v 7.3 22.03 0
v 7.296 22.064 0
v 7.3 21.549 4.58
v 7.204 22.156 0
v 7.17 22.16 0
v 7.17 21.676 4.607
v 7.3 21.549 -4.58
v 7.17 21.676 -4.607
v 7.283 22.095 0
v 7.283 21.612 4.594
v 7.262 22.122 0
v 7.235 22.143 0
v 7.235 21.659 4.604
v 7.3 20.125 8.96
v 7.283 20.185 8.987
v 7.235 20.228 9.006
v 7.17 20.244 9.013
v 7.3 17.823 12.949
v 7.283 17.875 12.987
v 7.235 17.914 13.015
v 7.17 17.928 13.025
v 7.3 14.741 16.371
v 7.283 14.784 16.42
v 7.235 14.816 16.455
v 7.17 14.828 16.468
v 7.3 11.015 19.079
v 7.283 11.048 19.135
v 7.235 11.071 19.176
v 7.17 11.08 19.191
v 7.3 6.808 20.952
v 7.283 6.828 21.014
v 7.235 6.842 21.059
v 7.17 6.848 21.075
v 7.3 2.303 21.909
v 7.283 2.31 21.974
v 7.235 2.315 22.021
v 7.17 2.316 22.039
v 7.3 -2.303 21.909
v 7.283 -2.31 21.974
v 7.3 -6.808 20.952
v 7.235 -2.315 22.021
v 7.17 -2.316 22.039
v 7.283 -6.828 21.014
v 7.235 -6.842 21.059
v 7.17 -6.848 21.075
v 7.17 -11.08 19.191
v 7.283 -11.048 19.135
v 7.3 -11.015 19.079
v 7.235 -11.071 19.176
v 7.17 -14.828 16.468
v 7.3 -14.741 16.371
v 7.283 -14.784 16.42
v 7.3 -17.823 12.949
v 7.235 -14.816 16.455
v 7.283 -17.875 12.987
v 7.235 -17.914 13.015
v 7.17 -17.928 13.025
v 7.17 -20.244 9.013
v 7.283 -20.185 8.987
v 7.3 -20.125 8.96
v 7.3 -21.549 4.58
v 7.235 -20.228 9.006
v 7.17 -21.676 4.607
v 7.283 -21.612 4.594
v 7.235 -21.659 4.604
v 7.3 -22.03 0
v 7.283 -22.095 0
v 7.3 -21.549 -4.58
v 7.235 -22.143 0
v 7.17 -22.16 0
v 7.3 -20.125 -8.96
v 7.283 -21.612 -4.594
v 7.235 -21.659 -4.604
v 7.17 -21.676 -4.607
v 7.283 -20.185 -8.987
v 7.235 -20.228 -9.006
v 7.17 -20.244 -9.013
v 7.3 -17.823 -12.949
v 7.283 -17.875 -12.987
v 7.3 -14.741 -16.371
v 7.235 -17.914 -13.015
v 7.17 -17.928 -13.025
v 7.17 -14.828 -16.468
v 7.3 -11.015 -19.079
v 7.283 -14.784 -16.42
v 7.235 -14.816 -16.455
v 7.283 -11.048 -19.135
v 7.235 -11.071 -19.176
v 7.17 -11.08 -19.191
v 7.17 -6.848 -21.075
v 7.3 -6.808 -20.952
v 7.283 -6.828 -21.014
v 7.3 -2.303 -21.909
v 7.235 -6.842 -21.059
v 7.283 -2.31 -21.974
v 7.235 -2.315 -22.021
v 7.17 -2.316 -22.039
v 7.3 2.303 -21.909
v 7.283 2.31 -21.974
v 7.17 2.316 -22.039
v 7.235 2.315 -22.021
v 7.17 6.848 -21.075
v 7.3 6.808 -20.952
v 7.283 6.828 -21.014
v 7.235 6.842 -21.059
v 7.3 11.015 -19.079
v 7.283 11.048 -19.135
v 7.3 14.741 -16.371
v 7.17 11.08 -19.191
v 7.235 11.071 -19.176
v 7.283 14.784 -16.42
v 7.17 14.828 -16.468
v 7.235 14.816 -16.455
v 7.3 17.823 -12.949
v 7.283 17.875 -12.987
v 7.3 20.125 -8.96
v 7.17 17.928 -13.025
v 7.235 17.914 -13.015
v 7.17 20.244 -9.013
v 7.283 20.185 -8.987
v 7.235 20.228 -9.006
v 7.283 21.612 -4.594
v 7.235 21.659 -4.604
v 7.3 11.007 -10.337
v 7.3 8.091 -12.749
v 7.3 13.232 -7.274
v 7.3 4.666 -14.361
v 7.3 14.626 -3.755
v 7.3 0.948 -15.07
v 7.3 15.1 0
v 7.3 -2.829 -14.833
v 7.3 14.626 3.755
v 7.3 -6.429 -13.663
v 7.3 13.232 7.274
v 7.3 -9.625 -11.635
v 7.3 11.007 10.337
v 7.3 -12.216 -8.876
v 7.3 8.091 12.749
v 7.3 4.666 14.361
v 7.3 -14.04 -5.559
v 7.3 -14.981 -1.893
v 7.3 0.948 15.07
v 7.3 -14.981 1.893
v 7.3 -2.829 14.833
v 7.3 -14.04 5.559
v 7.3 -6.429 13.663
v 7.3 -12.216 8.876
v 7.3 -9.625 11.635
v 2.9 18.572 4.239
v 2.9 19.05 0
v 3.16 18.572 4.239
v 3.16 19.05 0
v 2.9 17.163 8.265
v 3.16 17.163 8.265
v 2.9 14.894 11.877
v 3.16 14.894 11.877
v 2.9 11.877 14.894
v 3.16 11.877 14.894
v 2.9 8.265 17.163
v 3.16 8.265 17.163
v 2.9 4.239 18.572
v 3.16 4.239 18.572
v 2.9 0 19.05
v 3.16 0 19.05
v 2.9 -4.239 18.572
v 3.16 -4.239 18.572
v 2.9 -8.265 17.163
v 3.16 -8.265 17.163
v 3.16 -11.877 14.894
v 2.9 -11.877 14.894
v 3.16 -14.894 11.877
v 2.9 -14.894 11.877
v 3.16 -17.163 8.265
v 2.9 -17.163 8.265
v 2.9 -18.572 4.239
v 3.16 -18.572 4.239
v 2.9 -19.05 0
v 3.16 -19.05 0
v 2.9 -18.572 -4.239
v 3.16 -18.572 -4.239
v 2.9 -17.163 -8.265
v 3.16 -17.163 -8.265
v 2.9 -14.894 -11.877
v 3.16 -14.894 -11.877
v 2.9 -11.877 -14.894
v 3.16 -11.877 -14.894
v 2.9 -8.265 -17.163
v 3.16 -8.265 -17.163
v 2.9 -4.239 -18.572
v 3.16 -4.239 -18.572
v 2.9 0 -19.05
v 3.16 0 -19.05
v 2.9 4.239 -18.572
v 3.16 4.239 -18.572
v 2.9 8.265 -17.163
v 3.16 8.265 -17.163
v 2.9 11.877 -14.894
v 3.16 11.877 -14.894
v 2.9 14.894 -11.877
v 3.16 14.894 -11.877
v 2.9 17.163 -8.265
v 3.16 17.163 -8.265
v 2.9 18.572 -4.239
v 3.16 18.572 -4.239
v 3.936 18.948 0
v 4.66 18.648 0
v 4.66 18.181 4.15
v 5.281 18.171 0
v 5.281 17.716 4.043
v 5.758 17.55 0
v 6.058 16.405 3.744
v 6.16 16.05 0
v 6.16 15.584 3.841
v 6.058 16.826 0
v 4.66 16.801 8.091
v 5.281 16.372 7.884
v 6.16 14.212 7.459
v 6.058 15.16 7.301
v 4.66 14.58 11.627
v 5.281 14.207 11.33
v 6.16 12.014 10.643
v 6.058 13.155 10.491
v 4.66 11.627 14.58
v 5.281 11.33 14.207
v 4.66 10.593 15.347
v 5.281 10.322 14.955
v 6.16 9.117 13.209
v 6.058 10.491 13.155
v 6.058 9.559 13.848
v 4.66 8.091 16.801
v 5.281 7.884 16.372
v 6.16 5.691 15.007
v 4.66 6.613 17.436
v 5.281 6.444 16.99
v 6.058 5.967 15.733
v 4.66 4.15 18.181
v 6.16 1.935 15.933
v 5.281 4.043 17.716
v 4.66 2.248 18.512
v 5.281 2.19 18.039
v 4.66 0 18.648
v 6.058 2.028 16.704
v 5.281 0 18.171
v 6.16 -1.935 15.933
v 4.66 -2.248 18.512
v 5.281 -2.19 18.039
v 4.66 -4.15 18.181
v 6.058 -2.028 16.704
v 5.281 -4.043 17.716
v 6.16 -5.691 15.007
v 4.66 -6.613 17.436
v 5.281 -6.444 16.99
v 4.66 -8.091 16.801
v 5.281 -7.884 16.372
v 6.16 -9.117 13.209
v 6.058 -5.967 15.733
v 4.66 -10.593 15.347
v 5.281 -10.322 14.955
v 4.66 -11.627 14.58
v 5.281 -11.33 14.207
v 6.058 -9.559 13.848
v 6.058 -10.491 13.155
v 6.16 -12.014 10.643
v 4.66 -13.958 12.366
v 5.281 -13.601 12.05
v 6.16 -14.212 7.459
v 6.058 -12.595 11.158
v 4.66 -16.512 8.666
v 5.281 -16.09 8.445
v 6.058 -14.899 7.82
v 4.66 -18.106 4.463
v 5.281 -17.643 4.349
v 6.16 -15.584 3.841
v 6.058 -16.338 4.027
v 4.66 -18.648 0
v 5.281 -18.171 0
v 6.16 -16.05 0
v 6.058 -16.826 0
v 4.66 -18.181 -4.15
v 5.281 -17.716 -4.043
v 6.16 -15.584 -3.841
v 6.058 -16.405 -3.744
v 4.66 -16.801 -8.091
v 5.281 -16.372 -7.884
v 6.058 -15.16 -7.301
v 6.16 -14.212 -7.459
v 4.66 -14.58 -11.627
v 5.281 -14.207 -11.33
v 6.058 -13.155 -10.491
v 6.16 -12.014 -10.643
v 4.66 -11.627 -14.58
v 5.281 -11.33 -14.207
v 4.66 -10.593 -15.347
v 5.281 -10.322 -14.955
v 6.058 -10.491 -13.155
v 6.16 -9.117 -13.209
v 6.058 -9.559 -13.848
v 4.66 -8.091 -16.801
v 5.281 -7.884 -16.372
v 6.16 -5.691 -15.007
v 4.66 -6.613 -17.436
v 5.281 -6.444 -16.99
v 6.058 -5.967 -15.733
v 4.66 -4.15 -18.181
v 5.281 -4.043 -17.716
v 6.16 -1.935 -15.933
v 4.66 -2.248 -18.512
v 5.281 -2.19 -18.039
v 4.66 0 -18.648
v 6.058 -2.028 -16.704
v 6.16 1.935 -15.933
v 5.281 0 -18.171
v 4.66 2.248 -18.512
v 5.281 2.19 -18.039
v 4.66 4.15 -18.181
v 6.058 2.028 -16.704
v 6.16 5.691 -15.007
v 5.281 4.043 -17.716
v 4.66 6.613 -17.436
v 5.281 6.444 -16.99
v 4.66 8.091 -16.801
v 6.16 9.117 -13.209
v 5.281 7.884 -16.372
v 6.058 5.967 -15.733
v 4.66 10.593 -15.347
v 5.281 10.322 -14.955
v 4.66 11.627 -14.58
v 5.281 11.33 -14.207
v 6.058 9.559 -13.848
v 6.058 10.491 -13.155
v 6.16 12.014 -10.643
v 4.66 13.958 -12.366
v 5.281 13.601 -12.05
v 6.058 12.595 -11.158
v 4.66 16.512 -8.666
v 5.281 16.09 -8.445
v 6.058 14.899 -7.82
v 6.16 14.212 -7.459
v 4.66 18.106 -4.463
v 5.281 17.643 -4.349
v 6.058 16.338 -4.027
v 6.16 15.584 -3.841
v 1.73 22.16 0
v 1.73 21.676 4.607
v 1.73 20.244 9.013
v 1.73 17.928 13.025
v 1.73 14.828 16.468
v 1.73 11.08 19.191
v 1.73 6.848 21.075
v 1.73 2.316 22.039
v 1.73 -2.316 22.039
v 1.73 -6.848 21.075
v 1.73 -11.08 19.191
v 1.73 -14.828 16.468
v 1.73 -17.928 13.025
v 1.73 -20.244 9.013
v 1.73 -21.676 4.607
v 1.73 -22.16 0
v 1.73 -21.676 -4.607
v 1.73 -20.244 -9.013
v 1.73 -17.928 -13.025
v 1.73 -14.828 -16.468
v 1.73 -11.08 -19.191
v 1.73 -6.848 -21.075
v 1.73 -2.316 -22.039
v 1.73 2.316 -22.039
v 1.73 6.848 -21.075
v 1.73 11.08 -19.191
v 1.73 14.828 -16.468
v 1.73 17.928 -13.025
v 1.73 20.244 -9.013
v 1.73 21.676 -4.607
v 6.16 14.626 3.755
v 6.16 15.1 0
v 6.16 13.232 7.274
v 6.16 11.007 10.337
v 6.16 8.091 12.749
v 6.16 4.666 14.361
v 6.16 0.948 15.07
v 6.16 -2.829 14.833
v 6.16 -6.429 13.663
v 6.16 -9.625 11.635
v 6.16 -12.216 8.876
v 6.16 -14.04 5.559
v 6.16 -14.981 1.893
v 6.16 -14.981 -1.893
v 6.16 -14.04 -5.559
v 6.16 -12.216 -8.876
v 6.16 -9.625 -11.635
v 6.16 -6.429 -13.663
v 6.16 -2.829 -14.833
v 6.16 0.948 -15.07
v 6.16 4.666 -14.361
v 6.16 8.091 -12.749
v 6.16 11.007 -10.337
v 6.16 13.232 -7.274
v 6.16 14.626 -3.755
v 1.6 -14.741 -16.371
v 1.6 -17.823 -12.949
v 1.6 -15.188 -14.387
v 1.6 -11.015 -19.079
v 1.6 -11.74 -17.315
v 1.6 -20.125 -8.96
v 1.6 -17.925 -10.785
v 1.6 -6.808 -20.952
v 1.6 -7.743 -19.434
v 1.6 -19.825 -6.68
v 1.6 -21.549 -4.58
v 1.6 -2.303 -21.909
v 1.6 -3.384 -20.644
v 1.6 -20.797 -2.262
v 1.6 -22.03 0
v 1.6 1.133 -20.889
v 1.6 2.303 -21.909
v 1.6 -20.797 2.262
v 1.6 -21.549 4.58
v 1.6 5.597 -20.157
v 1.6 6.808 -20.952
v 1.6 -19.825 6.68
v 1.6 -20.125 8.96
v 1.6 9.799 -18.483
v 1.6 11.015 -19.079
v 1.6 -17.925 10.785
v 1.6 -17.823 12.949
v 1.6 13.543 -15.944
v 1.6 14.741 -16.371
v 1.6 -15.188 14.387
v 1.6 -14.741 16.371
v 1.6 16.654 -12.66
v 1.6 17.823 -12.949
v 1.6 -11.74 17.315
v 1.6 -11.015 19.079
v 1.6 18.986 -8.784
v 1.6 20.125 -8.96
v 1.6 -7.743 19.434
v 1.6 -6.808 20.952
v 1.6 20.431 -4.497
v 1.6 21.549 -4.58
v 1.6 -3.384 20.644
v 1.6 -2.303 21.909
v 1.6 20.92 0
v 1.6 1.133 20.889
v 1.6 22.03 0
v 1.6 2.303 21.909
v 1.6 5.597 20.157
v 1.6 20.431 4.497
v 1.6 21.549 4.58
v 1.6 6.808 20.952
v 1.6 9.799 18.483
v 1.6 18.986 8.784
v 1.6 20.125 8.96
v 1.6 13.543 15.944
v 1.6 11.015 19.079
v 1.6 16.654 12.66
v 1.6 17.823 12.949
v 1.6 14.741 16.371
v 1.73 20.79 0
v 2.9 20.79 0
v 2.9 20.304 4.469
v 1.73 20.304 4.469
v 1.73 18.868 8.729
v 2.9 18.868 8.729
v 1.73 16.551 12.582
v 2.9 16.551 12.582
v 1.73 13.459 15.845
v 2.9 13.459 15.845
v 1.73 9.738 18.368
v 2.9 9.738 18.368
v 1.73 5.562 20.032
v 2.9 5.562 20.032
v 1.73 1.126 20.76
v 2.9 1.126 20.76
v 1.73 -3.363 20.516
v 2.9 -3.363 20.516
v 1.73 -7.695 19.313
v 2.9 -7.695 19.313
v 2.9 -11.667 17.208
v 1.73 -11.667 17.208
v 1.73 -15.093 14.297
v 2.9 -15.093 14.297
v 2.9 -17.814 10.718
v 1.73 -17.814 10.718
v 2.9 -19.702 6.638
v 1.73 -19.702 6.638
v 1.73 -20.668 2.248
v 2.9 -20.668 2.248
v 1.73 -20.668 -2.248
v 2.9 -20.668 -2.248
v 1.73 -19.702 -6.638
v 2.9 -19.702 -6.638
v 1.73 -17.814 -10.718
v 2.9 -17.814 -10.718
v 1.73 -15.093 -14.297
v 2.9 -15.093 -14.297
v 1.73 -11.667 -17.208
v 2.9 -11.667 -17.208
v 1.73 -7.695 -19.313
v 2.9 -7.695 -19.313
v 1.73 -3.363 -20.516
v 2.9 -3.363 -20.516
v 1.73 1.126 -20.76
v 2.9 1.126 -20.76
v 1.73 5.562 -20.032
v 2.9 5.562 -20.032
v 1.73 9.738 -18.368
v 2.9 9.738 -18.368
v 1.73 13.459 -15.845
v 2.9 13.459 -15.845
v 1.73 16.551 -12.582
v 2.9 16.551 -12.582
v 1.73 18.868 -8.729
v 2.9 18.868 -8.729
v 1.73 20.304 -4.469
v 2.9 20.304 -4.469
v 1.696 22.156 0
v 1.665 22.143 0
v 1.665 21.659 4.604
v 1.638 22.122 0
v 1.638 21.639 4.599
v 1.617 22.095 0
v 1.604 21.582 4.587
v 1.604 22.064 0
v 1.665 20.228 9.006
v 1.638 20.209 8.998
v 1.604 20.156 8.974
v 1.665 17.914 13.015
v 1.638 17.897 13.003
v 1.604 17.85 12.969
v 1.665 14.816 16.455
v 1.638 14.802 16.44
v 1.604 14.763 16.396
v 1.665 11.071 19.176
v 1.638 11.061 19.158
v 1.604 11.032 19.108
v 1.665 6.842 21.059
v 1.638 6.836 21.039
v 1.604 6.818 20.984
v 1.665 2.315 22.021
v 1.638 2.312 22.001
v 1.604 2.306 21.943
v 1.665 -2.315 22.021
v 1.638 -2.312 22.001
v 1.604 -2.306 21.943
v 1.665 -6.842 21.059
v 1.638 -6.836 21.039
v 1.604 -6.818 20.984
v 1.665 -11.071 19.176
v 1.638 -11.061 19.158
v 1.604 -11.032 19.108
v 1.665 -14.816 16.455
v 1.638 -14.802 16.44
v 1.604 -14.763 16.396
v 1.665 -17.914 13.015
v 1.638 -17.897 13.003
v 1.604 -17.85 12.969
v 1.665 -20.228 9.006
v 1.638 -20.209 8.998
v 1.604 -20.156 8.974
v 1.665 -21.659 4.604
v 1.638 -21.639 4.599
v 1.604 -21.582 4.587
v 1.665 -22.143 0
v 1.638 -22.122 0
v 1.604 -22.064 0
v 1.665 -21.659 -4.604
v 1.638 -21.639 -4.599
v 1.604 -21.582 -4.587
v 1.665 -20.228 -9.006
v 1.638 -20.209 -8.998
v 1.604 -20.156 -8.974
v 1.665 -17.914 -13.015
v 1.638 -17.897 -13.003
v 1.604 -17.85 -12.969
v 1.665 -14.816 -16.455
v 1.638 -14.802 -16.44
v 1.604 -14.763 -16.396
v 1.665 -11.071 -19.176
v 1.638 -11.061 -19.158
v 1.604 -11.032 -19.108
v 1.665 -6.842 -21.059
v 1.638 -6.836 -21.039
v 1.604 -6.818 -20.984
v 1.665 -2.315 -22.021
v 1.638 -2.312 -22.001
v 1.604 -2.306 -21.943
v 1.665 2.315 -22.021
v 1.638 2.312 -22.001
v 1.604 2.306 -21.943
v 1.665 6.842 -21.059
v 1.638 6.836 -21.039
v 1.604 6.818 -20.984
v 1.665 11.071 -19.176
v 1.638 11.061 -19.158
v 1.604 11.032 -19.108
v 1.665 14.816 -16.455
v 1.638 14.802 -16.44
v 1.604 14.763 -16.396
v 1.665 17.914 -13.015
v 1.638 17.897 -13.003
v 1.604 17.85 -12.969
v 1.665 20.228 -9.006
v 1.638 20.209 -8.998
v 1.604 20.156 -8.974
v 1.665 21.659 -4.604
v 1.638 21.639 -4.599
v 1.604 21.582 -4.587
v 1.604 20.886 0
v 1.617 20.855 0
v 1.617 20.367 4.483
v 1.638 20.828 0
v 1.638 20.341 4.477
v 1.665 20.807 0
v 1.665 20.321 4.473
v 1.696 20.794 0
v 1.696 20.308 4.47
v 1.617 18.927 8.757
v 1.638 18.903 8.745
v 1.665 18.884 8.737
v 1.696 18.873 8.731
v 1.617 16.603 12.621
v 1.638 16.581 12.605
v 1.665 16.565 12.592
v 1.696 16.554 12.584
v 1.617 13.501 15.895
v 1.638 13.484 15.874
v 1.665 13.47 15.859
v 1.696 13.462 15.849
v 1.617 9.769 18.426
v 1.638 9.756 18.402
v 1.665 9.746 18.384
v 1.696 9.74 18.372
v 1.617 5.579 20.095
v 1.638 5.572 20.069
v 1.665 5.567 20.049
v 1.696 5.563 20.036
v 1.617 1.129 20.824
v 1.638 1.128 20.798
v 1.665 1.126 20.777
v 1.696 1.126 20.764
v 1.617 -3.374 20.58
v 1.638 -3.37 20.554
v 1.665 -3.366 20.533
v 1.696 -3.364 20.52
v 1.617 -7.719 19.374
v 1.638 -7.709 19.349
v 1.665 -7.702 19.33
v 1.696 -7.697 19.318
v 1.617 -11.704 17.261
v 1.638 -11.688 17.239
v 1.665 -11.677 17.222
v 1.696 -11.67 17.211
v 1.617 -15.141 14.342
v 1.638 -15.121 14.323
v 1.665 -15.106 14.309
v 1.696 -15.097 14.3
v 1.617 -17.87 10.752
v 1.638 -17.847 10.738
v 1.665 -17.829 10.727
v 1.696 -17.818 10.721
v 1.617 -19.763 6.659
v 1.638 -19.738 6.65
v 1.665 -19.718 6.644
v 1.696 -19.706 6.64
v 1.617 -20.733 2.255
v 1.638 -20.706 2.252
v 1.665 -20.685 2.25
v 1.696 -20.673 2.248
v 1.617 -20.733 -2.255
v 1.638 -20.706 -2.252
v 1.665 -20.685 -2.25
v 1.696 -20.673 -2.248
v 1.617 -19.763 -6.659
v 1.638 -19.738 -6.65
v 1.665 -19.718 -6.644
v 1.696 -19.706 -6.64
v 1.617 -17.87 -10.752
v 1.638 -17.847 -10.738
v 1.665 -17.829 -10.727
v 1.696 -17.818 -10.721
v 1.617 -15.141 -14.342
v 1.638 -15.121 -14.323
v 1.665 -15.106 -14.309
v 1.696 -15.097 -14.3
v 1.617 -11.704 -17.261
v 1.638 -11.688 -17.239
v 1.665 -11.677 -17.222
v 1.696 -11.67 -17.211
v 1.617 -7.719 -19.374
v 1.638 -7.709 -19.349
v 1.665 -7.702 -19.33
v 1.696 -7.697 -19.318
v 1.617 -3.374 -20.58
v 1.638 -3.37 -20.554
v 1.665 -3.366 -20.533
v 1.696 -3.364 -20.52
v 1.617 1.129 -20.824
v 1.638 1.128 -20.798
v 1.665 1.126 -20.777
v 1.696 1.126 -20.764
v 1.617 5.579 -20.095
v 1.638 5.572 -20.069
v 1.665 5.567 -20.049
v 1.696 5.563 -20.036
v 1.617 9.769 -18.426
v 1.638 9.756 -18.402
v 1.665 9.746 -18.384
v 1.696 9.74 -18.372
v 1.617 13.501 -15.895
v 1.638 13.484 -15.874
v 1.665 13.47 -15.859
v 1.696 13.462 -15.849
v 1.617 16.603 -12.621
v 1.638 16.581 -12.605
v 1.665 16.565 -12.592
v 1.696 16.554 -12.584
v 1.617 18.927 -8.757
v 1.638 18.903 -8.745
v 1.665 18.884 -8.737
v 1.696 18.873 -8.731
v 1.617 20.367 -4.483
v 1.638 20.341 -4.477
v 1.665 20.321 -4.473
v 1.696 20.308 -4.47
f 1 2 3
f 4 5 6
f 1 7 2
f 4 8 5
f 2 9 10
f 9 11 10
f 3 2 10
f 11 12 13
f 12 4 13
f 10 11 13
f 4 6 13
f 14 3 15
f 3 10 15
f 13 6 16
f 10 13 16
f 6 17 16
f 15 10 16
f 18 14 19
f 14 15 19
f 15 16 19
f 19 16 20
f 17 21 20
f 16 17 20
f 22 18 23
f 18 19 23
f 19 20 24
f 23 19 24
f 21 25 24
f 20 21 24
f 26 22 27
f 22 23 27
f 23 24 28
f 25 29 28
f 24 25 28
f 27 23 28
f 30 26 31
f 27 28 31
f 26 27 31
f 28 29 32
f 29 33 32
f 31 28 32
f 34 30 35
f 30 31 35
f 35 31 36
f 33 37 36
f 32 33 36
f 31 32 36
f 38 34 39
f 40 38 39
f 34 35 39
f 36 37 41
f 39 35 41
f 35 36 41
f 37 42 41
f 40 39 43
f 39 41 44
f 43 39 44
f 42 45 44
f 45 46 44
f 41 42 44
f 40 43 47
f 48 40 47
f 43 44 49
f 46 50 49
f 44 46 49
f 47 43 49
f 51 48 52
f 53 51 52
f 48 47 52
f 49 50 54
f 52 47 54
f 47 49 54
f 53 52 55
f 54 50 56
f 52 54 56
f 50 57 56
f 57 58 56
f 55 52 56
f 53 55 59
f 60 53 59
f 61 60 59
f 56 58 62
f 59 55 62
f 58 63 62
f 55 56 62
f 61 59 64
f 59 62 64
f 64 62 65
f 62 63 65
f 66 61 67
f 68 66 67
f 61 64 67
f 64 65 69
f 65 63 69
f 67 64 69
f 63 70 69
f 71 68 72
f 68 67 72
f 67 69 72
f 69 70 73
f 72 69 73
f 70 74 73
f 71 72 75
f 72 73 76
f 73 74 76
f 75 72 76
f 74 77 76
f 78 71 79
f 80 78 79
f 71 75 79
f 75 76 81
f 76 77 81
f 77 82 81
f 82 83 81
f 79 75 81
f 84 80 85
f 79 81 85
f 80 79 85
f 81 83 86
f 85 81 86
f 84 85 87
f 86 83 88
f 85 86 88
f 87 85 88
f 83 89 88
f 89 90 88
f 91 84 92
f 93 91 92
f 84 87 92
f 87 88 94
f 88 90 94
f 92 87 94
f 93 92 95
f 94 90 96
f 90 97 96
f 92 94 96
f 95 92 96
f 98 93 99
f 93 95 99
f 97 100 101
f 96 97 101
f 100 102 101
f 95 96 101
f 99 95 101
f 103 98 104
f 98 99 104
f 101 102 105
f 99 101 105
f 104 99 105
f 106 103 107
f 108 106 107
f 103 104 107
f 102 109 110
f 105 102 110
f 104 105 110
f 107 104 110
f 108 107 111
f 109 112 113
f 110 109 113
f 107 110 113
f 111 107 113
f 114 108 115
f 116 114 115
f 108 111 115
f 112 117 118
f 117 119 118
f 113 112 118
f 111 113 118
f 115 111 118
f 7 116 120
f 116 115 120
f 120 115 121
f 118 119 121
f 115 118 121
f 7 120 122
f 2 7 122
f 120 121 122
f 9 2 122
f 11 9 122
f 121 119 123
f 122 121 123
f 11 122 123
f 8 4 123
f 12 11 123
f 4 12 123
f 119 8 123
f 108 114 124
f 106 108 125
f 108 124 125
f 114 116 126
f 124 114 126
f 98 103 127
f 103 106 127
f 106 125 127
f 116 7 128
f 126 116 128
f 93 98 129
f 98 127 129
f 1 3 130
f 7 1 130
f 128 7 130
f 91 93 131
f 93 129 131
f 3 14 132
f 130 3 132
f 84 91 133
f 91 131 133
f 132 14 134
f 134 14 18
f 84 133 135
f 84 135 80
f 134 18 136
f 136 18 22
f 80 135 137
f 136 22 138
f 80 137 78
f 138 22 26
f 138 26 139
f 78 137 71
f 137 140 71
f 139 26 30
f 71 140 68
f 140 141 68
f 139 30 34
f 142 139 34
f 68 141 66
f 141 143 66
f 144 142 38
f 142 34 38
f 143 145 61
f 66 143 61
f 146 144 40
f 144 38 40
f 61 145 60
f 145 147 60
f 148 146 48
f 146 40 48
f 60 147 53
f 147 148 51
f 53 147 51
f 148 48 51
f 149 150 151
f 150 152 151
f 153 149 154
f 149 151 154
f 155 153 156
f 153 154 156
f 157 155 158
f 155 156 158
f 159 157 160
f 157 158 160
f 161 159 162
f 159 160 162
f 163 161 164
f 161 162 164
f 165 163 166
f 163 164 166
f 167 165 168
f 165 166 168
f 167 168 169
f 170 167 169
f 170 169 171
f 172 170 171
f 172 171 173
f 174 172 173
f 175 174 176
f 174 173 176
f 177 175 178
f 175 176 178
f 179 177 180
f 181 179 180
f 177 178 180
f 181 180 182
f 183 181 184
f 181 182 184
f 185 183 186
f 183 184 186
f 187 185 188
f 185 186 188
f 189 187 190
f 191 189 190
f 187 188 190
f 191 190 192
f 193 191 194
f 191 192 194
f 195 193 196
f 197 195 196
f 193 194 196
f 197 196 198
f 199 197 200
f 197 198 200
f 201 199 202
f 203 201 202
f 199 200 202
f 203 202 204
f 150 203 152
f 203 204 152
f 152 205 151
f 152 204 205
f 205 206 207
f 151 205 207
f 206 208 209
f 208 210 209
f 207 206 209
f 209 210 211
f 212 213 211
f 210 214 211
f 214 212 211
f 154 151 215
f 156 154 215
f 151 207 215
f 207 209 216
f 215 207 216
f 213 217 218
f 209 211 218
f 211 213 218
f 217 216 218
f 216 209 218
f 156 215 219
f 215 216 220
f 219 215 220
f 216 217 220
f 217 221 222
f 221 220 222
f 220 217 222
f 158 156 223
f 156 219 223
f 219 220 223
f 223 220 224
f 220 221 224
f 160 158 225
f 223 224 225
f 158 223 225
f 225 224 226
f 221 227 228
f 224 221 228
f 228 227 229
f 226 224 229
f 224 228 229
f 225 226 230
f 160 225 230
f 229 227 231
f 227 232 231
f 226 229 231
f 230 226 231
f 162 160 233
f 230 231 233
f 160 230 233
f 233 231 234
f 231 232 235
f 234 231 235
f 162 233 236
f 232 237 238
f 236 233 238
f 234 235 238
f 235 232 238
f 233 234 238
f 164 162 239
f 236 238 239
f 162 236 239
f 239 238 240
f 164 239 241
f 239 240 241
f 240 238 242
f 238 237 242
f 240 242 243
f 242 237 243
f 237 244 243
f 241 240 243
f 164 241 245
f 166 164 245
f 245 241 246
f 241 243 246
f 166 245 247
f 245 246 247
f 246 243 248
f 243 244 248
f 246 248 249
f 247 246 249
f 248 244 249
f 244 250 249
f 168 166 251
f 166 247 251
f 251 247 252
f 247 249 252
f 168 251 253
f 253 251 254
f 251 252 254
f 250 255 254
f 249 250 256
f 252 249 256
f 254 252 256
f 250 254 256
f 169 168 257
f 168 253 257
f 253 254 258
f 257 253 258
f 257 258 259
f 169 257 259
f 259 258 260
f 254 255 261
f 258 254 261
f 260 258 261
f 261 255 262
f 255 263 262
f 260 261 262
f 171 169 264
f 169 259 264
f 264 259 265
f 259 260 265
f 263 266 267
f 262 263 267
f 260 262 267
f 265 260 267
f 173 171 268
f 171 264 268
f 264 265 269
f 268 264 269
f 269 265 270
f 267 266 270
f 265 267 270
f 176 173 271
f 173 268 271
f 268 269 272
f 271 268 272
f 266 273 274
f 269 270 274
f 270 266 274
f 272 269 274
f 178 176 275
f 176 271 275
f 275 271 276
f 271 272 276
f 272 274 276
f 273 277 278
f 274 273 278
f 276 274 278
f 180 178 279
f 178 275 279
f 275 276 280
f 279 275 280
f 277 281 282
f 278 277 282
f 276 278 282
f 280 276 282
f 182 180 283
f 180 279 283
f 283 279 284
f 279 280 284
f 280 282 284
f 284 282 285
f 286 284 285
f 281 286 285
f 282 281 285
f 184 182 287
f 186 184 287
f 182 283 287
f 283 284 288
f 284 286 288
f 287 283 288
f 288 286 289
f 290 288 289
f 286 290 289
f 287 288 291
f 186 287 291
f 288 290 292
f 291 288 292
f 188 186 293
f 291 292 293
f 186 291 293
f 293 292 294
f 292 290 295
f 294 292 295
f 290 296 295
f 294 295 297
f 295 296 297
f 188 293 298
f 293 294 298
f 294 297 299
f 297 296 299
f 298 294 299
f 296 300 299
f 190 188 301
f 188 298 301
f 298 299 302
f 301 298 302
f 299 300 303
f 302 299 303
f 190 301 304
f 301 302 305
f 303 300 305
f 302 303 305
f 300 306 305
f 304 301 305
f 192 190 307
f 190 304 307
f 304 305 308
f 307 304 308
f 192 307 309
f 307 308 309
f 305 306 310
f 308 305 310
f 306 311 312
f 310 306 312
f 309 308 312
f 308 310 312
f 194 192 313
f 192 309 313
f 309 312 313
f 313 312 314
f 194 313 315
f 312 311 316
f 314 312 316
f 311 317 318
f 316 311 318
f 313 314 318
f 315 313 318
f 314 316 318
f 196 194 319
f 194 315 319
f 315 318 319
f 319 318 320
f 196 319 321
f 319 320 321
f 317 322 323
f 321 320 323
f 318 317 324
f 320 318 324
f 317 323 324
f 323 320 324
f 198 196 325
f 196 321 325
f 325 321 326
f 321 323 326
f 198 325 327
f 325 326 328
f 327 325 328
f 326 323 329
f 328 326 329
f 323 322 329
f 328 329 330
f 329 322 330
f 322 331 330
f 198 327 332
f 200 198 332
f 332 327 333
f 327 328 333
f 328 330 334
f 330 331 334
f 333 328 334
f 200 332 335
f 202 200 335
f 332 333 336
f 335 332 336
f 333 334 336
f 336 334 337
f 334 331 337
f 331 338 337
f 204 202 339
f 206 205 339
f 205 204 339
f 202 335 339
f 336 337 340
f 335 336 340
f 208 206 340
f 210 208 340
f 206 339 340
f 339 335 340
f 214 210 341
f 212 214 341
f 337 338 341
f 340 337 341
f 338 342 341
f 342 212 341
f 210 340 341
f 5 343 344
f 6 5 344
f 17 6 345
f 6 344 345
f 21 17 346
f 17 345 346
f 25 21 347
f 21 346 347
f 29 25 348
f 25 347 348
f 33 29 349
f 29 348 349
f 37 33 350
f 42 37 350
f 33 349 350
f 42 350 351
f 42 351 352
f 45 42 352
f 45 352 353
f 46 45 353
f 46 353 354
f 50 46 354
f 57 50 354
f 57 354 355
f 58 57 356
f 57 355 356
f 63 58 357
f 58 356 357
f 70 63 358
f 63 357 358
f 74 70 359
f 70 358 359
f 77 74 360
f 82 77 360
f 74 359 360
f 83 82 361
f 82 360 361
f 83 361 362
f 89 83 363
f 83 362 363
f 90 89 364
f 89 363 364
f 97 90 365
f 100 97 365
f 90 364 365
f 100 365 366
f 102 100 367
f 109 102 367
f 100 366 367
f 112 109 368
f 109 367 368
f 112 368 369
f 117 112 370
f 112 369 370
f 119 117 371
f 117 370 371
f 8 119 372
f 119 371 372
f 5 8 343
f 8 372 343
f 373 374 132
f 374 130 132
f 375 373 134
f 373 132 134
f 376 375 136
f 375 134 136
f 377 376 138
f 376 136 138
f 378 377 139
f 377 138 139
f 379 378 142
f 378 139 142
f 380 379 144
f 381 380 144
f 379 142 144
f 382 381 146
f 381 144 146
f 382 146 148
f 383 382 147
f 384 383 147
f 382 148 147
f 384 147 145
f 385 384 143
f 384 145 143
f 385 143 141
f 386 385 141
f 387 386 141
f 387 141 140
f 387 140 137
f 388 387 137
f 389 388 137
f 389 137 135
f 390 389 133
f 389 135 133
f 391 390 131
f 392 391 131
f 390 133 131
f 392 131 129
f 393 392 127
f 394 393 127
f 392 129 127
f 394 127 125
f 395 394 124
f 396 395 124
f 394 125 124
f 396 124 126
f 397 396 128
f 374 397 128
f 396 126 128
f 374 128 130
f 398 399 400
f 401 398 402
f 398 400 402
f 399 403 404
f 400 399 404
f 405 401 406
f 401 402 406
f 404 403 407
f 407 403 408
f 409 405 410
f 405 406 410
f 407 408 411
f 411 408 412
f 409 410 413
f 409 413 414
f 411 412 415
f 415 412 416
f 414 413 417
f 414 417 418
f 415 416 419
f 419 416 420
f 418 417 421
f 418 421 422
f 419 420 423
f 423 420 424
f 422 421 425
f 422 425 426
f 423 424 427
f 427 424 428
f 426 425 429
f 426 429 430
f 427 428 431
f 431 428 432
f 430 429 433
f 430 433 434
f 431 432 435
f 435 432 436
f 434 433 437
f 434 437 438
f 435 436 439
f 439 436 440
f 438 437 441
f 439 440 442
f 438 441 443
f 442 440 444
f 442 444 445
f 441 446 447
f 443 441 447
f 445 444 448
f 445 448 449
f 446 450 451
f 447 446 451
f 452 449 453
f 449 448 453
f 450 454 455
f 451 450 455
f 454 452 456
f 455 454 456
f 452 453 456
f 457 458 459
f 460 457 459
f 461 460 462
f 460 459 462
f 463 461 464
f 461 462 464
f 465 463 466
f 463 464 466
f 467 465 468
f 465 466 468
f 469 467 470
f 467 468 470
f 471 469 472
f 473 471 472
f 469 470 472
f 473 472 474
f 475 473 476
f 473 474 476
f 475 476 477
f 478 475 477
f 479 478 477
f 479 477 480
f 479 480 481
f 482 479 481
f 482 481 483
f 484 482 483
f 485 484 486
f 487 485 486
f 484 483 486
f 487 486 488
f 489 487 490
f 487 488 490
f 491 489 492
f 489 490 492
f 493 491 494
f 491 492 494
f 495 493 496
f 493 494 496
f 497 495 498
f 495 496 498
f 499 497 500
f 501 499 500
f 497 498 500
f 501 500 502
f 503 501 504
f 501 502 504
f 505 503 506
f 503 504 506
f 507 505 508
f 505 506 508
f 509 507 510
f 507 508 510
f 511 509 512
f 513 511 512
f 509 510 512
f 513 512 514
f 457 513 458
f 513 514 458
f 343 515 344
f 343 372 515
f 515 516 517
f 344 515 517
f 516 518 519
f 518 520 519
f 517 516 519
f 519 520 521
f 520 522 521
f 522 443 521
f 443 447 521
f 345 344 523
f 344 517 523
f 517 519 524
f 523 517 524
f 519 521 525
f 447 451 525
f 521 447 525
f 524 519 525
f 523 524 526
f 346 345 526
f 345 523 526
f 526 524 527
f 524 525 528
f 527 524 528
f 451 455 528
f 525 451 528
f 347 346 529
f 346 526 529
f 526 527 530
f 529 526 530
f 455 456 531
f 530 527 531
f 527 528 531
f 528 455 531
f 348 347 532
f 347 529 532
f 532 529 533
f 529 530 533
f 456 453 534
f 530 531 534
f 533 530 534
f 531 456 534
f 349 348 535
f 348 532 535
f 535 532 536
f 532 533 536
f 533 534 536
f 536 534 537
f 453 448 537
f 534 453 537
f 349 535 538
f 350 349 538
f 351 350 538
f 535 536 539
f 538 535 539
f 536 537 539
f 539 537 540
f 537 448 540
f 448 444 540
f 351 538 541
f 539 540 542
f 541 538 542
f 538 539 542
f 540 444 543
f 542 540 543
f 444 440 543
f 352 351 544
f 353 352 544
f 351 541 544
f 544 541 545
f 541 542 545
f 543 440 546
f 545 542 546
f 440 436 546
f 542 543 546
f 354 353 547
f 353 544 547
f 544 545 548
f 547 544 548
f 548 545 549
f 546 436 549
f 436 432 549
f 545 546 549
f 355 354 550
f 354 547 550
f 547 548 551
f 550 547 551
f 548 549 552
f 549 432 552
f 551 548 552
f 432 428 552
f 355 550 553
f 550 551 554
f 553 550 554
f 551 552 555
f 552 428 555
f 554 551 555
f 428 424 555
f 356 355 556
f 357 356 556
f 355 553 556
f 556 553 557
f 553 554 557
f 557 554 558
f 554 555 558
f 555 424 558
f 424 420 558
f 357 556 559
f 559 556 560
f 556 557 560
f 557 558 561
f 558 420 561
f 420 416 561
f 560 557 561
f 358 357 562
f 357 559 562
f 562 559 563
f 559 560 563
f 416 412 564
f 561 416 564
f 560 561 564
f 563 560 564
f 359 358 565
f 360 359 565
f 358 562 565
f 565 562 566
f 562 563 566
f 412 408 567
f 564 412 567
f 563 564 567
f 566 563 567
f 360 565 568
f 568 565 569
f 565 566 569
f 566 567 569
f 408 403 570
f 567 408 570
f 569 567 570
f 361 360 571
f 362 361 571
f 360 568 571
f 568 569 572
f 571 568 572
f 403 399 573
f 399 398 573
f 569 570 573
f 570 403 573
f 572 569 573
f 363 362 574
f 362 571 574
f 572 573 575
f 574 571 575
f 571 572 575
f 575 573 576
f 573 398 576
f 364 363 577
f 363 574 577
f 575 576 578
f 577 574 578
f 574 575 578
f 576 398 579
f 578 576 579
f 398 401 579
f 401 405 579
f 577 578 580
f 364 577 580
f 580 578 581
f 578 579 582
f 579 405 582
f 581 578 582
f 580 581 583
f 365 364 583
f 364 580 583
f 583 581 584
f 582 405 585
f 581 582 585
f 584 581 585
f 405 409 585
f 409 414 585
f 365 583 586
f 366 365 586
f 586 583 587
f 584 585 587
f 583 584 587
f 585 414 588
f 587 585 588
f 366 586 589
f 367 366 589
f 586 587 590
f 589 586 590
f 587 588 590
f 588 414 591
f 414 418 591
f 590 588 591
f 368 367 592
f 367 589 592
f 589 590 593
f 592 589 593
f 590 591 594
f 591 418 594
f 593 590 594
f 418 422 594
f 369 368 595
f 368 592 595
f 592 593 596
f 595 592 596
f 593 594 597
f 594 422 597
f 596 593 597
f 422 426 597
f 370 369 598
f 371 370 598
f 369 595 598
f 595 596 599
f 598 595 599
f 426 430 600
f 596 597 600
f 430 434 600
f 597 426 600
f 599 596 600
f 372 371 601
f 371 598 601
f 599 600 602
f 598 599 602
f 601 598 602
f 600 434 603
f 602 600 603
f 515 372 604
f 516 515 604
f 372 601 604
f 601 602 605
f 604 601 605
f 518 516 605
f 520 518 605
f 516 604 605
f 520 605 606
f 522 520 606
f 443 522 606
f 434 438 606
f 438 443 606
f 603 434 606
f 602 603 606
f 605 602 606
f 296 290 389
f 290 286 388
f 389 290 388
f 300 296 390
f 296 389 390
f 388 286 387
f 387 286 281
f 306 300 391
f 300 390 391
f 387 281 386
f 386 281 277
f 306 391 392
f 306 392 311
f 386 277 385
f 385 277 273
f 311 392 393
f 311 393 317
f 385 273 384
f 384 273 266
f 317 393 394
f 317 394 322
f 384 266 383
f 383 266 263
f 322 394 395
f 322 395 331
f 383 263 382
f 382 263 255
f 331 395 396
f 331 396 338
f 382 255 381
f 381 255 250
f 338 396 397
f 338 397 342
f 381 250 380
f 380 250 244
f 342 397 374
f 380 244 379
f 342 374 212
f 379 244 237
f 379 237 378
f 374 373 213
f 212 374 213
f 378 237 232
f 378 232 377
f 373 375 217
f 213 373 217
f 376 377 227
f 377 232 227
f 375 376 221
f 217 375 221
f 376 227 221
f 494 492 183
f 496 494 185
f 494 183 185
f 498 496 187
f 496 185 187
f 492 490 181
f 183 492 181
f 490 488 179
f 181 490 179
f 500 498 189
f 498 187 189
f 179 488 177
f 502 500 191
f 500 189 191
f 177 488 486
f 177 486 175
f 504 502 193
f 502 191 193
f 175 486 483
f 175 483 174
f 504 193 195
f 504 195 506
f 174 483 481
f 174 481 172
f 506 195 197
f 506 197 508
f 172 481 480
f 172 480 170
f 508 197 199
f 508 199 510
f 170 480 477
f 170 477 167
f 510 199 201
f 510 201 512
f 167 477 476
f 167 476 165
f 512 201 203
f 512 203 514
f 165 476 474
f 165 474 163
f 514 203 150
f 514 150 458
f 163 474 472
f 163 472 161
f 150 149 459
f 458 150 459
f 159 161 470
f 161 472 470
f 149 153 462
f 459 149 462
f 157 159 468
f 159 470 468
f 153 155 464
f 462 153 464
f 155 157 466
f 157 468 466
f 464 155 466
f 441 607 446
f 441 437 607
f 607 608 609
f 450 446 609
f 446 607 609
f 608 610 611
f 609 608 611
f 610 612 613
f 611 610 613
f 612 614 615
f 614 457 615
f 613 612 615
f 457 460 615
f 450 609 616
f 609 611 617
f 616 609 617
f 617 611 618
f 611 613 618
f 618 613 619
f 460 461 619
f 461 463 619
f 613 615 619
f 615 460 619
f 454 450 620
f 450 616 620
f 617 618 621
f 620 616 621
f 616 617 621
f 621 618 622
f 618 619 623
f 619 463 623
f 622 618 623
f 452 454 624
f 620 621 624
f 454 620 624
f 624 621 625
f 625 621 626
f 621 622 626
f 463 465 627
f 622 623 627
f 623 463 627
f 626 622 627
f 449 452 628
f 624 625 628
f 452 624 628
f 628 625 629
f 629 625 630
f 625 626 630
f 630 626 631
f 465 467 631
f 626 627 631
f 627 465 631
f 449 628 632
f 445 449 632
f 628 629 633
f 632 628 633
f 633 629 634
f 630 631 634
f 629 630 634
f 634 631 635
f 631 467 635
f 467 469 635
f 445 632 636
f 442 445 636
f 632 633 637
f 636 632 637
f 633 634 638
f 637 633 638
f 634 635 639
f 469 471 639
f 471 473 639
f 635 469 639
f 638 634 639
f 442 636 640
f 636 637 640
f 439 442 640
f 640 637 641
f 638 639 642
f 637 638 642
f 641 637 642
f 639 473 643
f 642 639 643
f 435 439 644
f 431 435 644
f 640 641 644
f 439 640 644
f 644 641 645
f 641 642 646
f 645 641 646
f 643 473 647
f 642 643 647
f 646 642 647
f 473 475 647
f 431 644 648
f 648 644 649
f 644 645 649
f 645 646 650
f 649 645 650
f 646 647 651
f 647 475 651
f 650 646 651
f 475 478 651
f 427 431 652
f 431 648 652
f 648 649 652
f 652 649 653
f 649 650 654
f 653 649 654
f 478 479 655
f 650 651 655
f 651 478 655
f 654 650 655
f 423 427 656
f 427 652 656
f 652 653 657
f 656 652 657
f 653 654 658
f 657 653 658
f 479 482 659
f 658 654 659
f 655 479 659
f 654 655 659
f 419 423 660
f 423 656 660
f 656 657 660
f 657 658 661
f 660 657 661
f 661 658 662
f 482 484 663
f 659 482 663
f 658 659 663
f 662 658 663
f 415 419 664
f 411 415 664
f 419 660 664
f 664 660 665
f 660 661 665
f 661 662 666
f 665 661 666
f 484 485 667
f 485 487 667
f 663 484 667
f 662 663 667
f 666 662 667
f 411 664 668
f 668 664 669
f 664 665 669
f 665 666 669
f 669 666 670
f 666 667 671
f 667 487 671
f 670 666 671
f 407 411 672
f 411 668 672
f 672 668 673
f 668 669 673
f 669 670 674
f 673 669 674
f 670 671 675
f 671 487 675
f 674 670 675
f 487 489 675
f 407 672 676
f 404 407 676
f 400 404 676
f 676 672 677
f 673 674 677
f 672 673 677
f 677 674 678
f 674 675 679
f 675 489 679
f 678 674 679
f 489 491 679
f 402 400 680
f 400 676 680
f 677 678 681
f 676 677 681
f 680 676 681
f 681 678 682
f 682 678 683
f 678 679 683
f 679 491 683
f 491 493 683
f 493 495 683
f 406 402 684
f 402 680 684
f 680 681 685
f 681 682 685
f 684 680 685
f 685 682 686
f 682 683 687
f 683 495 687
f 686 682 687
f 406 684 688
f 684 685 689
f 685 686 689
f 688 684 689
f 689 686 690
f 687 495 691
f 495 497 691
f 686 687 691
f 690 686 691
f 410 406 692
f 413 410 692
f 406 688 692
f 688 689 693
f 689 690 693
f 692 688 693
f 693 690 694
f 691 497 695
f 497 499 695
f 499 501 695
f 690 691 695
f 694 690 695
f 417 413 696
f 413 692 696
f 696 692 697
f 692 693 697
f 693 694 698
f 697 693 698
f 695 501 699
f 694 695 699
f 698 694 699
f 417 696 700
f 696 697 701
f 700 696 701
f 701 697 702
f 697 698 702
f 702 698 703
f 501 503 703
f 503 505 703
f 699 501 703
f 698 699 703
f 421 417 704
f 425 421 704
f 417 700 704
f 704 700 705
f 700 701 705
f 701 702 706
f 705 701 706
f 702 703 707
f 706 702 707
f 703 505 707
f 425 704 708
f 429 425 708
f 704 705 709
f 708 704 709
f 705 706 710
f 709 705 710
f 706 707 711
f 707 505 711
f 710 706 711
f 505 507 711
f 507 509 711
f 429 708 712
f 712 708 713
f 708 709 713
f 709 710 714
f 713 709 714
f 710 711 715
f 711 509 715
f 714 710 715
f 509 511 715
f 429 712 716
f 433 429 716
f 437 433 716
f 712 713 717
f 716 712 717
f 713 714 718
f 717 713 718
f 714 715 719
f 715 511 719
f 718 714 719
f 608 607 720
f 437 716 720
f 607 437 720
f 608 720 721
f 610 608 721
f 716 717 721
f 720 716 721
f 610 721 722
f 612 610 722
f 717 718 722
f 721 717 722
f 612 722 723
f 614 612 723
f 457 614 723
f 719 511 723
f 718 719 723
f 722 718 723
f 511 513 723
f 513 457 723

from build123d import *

# Parameters (mm, degrees)
F2_R = 0.13


# Not quite as in the source:
# - a feature names something its author has since deleted; it is built from what else it names


with BuildPart() as f1:
    # F0 (on Top) → F1 (revolve)
    with BuildSketch(Plane.XY):
        with BuildLine():
            Line((7.3, 15.1), (7.3, 22.16))
            Line((7.3, 22.16), (1.6, 22.16))
            Line((1.6, 22.16), (1.6, 20.79))
            Line((1.6, 20.79), (2.9, 20.79))
            Line((2.9, 20.79), (2.9, 19.05))
            Line((2.9, 19.05), (3.16, 19.05))
            ThreePointArc((3.16, 19.05), (5.2813203436, 18.1713203436), (6.16, 16.05))
            Line((6.16, 16.05), (6.16, 15.1))
            Line((6.16, 15.1), (7.3, 15.1))
        make_face()
    revolve(axis=Axis((7.0380799007, 0, 0), (1, 0, 0)))

    # F2
    f2_edges = [f1.edges().sort_by_distance(p)[0] for p in [
        (7.3, -22.16, 0),
        (1.6, -22.16, 0),
        (1.6, -20.79, 0),
    ]]
    fillet(f2_edges, radius=F2_R)


solid = f1.part
